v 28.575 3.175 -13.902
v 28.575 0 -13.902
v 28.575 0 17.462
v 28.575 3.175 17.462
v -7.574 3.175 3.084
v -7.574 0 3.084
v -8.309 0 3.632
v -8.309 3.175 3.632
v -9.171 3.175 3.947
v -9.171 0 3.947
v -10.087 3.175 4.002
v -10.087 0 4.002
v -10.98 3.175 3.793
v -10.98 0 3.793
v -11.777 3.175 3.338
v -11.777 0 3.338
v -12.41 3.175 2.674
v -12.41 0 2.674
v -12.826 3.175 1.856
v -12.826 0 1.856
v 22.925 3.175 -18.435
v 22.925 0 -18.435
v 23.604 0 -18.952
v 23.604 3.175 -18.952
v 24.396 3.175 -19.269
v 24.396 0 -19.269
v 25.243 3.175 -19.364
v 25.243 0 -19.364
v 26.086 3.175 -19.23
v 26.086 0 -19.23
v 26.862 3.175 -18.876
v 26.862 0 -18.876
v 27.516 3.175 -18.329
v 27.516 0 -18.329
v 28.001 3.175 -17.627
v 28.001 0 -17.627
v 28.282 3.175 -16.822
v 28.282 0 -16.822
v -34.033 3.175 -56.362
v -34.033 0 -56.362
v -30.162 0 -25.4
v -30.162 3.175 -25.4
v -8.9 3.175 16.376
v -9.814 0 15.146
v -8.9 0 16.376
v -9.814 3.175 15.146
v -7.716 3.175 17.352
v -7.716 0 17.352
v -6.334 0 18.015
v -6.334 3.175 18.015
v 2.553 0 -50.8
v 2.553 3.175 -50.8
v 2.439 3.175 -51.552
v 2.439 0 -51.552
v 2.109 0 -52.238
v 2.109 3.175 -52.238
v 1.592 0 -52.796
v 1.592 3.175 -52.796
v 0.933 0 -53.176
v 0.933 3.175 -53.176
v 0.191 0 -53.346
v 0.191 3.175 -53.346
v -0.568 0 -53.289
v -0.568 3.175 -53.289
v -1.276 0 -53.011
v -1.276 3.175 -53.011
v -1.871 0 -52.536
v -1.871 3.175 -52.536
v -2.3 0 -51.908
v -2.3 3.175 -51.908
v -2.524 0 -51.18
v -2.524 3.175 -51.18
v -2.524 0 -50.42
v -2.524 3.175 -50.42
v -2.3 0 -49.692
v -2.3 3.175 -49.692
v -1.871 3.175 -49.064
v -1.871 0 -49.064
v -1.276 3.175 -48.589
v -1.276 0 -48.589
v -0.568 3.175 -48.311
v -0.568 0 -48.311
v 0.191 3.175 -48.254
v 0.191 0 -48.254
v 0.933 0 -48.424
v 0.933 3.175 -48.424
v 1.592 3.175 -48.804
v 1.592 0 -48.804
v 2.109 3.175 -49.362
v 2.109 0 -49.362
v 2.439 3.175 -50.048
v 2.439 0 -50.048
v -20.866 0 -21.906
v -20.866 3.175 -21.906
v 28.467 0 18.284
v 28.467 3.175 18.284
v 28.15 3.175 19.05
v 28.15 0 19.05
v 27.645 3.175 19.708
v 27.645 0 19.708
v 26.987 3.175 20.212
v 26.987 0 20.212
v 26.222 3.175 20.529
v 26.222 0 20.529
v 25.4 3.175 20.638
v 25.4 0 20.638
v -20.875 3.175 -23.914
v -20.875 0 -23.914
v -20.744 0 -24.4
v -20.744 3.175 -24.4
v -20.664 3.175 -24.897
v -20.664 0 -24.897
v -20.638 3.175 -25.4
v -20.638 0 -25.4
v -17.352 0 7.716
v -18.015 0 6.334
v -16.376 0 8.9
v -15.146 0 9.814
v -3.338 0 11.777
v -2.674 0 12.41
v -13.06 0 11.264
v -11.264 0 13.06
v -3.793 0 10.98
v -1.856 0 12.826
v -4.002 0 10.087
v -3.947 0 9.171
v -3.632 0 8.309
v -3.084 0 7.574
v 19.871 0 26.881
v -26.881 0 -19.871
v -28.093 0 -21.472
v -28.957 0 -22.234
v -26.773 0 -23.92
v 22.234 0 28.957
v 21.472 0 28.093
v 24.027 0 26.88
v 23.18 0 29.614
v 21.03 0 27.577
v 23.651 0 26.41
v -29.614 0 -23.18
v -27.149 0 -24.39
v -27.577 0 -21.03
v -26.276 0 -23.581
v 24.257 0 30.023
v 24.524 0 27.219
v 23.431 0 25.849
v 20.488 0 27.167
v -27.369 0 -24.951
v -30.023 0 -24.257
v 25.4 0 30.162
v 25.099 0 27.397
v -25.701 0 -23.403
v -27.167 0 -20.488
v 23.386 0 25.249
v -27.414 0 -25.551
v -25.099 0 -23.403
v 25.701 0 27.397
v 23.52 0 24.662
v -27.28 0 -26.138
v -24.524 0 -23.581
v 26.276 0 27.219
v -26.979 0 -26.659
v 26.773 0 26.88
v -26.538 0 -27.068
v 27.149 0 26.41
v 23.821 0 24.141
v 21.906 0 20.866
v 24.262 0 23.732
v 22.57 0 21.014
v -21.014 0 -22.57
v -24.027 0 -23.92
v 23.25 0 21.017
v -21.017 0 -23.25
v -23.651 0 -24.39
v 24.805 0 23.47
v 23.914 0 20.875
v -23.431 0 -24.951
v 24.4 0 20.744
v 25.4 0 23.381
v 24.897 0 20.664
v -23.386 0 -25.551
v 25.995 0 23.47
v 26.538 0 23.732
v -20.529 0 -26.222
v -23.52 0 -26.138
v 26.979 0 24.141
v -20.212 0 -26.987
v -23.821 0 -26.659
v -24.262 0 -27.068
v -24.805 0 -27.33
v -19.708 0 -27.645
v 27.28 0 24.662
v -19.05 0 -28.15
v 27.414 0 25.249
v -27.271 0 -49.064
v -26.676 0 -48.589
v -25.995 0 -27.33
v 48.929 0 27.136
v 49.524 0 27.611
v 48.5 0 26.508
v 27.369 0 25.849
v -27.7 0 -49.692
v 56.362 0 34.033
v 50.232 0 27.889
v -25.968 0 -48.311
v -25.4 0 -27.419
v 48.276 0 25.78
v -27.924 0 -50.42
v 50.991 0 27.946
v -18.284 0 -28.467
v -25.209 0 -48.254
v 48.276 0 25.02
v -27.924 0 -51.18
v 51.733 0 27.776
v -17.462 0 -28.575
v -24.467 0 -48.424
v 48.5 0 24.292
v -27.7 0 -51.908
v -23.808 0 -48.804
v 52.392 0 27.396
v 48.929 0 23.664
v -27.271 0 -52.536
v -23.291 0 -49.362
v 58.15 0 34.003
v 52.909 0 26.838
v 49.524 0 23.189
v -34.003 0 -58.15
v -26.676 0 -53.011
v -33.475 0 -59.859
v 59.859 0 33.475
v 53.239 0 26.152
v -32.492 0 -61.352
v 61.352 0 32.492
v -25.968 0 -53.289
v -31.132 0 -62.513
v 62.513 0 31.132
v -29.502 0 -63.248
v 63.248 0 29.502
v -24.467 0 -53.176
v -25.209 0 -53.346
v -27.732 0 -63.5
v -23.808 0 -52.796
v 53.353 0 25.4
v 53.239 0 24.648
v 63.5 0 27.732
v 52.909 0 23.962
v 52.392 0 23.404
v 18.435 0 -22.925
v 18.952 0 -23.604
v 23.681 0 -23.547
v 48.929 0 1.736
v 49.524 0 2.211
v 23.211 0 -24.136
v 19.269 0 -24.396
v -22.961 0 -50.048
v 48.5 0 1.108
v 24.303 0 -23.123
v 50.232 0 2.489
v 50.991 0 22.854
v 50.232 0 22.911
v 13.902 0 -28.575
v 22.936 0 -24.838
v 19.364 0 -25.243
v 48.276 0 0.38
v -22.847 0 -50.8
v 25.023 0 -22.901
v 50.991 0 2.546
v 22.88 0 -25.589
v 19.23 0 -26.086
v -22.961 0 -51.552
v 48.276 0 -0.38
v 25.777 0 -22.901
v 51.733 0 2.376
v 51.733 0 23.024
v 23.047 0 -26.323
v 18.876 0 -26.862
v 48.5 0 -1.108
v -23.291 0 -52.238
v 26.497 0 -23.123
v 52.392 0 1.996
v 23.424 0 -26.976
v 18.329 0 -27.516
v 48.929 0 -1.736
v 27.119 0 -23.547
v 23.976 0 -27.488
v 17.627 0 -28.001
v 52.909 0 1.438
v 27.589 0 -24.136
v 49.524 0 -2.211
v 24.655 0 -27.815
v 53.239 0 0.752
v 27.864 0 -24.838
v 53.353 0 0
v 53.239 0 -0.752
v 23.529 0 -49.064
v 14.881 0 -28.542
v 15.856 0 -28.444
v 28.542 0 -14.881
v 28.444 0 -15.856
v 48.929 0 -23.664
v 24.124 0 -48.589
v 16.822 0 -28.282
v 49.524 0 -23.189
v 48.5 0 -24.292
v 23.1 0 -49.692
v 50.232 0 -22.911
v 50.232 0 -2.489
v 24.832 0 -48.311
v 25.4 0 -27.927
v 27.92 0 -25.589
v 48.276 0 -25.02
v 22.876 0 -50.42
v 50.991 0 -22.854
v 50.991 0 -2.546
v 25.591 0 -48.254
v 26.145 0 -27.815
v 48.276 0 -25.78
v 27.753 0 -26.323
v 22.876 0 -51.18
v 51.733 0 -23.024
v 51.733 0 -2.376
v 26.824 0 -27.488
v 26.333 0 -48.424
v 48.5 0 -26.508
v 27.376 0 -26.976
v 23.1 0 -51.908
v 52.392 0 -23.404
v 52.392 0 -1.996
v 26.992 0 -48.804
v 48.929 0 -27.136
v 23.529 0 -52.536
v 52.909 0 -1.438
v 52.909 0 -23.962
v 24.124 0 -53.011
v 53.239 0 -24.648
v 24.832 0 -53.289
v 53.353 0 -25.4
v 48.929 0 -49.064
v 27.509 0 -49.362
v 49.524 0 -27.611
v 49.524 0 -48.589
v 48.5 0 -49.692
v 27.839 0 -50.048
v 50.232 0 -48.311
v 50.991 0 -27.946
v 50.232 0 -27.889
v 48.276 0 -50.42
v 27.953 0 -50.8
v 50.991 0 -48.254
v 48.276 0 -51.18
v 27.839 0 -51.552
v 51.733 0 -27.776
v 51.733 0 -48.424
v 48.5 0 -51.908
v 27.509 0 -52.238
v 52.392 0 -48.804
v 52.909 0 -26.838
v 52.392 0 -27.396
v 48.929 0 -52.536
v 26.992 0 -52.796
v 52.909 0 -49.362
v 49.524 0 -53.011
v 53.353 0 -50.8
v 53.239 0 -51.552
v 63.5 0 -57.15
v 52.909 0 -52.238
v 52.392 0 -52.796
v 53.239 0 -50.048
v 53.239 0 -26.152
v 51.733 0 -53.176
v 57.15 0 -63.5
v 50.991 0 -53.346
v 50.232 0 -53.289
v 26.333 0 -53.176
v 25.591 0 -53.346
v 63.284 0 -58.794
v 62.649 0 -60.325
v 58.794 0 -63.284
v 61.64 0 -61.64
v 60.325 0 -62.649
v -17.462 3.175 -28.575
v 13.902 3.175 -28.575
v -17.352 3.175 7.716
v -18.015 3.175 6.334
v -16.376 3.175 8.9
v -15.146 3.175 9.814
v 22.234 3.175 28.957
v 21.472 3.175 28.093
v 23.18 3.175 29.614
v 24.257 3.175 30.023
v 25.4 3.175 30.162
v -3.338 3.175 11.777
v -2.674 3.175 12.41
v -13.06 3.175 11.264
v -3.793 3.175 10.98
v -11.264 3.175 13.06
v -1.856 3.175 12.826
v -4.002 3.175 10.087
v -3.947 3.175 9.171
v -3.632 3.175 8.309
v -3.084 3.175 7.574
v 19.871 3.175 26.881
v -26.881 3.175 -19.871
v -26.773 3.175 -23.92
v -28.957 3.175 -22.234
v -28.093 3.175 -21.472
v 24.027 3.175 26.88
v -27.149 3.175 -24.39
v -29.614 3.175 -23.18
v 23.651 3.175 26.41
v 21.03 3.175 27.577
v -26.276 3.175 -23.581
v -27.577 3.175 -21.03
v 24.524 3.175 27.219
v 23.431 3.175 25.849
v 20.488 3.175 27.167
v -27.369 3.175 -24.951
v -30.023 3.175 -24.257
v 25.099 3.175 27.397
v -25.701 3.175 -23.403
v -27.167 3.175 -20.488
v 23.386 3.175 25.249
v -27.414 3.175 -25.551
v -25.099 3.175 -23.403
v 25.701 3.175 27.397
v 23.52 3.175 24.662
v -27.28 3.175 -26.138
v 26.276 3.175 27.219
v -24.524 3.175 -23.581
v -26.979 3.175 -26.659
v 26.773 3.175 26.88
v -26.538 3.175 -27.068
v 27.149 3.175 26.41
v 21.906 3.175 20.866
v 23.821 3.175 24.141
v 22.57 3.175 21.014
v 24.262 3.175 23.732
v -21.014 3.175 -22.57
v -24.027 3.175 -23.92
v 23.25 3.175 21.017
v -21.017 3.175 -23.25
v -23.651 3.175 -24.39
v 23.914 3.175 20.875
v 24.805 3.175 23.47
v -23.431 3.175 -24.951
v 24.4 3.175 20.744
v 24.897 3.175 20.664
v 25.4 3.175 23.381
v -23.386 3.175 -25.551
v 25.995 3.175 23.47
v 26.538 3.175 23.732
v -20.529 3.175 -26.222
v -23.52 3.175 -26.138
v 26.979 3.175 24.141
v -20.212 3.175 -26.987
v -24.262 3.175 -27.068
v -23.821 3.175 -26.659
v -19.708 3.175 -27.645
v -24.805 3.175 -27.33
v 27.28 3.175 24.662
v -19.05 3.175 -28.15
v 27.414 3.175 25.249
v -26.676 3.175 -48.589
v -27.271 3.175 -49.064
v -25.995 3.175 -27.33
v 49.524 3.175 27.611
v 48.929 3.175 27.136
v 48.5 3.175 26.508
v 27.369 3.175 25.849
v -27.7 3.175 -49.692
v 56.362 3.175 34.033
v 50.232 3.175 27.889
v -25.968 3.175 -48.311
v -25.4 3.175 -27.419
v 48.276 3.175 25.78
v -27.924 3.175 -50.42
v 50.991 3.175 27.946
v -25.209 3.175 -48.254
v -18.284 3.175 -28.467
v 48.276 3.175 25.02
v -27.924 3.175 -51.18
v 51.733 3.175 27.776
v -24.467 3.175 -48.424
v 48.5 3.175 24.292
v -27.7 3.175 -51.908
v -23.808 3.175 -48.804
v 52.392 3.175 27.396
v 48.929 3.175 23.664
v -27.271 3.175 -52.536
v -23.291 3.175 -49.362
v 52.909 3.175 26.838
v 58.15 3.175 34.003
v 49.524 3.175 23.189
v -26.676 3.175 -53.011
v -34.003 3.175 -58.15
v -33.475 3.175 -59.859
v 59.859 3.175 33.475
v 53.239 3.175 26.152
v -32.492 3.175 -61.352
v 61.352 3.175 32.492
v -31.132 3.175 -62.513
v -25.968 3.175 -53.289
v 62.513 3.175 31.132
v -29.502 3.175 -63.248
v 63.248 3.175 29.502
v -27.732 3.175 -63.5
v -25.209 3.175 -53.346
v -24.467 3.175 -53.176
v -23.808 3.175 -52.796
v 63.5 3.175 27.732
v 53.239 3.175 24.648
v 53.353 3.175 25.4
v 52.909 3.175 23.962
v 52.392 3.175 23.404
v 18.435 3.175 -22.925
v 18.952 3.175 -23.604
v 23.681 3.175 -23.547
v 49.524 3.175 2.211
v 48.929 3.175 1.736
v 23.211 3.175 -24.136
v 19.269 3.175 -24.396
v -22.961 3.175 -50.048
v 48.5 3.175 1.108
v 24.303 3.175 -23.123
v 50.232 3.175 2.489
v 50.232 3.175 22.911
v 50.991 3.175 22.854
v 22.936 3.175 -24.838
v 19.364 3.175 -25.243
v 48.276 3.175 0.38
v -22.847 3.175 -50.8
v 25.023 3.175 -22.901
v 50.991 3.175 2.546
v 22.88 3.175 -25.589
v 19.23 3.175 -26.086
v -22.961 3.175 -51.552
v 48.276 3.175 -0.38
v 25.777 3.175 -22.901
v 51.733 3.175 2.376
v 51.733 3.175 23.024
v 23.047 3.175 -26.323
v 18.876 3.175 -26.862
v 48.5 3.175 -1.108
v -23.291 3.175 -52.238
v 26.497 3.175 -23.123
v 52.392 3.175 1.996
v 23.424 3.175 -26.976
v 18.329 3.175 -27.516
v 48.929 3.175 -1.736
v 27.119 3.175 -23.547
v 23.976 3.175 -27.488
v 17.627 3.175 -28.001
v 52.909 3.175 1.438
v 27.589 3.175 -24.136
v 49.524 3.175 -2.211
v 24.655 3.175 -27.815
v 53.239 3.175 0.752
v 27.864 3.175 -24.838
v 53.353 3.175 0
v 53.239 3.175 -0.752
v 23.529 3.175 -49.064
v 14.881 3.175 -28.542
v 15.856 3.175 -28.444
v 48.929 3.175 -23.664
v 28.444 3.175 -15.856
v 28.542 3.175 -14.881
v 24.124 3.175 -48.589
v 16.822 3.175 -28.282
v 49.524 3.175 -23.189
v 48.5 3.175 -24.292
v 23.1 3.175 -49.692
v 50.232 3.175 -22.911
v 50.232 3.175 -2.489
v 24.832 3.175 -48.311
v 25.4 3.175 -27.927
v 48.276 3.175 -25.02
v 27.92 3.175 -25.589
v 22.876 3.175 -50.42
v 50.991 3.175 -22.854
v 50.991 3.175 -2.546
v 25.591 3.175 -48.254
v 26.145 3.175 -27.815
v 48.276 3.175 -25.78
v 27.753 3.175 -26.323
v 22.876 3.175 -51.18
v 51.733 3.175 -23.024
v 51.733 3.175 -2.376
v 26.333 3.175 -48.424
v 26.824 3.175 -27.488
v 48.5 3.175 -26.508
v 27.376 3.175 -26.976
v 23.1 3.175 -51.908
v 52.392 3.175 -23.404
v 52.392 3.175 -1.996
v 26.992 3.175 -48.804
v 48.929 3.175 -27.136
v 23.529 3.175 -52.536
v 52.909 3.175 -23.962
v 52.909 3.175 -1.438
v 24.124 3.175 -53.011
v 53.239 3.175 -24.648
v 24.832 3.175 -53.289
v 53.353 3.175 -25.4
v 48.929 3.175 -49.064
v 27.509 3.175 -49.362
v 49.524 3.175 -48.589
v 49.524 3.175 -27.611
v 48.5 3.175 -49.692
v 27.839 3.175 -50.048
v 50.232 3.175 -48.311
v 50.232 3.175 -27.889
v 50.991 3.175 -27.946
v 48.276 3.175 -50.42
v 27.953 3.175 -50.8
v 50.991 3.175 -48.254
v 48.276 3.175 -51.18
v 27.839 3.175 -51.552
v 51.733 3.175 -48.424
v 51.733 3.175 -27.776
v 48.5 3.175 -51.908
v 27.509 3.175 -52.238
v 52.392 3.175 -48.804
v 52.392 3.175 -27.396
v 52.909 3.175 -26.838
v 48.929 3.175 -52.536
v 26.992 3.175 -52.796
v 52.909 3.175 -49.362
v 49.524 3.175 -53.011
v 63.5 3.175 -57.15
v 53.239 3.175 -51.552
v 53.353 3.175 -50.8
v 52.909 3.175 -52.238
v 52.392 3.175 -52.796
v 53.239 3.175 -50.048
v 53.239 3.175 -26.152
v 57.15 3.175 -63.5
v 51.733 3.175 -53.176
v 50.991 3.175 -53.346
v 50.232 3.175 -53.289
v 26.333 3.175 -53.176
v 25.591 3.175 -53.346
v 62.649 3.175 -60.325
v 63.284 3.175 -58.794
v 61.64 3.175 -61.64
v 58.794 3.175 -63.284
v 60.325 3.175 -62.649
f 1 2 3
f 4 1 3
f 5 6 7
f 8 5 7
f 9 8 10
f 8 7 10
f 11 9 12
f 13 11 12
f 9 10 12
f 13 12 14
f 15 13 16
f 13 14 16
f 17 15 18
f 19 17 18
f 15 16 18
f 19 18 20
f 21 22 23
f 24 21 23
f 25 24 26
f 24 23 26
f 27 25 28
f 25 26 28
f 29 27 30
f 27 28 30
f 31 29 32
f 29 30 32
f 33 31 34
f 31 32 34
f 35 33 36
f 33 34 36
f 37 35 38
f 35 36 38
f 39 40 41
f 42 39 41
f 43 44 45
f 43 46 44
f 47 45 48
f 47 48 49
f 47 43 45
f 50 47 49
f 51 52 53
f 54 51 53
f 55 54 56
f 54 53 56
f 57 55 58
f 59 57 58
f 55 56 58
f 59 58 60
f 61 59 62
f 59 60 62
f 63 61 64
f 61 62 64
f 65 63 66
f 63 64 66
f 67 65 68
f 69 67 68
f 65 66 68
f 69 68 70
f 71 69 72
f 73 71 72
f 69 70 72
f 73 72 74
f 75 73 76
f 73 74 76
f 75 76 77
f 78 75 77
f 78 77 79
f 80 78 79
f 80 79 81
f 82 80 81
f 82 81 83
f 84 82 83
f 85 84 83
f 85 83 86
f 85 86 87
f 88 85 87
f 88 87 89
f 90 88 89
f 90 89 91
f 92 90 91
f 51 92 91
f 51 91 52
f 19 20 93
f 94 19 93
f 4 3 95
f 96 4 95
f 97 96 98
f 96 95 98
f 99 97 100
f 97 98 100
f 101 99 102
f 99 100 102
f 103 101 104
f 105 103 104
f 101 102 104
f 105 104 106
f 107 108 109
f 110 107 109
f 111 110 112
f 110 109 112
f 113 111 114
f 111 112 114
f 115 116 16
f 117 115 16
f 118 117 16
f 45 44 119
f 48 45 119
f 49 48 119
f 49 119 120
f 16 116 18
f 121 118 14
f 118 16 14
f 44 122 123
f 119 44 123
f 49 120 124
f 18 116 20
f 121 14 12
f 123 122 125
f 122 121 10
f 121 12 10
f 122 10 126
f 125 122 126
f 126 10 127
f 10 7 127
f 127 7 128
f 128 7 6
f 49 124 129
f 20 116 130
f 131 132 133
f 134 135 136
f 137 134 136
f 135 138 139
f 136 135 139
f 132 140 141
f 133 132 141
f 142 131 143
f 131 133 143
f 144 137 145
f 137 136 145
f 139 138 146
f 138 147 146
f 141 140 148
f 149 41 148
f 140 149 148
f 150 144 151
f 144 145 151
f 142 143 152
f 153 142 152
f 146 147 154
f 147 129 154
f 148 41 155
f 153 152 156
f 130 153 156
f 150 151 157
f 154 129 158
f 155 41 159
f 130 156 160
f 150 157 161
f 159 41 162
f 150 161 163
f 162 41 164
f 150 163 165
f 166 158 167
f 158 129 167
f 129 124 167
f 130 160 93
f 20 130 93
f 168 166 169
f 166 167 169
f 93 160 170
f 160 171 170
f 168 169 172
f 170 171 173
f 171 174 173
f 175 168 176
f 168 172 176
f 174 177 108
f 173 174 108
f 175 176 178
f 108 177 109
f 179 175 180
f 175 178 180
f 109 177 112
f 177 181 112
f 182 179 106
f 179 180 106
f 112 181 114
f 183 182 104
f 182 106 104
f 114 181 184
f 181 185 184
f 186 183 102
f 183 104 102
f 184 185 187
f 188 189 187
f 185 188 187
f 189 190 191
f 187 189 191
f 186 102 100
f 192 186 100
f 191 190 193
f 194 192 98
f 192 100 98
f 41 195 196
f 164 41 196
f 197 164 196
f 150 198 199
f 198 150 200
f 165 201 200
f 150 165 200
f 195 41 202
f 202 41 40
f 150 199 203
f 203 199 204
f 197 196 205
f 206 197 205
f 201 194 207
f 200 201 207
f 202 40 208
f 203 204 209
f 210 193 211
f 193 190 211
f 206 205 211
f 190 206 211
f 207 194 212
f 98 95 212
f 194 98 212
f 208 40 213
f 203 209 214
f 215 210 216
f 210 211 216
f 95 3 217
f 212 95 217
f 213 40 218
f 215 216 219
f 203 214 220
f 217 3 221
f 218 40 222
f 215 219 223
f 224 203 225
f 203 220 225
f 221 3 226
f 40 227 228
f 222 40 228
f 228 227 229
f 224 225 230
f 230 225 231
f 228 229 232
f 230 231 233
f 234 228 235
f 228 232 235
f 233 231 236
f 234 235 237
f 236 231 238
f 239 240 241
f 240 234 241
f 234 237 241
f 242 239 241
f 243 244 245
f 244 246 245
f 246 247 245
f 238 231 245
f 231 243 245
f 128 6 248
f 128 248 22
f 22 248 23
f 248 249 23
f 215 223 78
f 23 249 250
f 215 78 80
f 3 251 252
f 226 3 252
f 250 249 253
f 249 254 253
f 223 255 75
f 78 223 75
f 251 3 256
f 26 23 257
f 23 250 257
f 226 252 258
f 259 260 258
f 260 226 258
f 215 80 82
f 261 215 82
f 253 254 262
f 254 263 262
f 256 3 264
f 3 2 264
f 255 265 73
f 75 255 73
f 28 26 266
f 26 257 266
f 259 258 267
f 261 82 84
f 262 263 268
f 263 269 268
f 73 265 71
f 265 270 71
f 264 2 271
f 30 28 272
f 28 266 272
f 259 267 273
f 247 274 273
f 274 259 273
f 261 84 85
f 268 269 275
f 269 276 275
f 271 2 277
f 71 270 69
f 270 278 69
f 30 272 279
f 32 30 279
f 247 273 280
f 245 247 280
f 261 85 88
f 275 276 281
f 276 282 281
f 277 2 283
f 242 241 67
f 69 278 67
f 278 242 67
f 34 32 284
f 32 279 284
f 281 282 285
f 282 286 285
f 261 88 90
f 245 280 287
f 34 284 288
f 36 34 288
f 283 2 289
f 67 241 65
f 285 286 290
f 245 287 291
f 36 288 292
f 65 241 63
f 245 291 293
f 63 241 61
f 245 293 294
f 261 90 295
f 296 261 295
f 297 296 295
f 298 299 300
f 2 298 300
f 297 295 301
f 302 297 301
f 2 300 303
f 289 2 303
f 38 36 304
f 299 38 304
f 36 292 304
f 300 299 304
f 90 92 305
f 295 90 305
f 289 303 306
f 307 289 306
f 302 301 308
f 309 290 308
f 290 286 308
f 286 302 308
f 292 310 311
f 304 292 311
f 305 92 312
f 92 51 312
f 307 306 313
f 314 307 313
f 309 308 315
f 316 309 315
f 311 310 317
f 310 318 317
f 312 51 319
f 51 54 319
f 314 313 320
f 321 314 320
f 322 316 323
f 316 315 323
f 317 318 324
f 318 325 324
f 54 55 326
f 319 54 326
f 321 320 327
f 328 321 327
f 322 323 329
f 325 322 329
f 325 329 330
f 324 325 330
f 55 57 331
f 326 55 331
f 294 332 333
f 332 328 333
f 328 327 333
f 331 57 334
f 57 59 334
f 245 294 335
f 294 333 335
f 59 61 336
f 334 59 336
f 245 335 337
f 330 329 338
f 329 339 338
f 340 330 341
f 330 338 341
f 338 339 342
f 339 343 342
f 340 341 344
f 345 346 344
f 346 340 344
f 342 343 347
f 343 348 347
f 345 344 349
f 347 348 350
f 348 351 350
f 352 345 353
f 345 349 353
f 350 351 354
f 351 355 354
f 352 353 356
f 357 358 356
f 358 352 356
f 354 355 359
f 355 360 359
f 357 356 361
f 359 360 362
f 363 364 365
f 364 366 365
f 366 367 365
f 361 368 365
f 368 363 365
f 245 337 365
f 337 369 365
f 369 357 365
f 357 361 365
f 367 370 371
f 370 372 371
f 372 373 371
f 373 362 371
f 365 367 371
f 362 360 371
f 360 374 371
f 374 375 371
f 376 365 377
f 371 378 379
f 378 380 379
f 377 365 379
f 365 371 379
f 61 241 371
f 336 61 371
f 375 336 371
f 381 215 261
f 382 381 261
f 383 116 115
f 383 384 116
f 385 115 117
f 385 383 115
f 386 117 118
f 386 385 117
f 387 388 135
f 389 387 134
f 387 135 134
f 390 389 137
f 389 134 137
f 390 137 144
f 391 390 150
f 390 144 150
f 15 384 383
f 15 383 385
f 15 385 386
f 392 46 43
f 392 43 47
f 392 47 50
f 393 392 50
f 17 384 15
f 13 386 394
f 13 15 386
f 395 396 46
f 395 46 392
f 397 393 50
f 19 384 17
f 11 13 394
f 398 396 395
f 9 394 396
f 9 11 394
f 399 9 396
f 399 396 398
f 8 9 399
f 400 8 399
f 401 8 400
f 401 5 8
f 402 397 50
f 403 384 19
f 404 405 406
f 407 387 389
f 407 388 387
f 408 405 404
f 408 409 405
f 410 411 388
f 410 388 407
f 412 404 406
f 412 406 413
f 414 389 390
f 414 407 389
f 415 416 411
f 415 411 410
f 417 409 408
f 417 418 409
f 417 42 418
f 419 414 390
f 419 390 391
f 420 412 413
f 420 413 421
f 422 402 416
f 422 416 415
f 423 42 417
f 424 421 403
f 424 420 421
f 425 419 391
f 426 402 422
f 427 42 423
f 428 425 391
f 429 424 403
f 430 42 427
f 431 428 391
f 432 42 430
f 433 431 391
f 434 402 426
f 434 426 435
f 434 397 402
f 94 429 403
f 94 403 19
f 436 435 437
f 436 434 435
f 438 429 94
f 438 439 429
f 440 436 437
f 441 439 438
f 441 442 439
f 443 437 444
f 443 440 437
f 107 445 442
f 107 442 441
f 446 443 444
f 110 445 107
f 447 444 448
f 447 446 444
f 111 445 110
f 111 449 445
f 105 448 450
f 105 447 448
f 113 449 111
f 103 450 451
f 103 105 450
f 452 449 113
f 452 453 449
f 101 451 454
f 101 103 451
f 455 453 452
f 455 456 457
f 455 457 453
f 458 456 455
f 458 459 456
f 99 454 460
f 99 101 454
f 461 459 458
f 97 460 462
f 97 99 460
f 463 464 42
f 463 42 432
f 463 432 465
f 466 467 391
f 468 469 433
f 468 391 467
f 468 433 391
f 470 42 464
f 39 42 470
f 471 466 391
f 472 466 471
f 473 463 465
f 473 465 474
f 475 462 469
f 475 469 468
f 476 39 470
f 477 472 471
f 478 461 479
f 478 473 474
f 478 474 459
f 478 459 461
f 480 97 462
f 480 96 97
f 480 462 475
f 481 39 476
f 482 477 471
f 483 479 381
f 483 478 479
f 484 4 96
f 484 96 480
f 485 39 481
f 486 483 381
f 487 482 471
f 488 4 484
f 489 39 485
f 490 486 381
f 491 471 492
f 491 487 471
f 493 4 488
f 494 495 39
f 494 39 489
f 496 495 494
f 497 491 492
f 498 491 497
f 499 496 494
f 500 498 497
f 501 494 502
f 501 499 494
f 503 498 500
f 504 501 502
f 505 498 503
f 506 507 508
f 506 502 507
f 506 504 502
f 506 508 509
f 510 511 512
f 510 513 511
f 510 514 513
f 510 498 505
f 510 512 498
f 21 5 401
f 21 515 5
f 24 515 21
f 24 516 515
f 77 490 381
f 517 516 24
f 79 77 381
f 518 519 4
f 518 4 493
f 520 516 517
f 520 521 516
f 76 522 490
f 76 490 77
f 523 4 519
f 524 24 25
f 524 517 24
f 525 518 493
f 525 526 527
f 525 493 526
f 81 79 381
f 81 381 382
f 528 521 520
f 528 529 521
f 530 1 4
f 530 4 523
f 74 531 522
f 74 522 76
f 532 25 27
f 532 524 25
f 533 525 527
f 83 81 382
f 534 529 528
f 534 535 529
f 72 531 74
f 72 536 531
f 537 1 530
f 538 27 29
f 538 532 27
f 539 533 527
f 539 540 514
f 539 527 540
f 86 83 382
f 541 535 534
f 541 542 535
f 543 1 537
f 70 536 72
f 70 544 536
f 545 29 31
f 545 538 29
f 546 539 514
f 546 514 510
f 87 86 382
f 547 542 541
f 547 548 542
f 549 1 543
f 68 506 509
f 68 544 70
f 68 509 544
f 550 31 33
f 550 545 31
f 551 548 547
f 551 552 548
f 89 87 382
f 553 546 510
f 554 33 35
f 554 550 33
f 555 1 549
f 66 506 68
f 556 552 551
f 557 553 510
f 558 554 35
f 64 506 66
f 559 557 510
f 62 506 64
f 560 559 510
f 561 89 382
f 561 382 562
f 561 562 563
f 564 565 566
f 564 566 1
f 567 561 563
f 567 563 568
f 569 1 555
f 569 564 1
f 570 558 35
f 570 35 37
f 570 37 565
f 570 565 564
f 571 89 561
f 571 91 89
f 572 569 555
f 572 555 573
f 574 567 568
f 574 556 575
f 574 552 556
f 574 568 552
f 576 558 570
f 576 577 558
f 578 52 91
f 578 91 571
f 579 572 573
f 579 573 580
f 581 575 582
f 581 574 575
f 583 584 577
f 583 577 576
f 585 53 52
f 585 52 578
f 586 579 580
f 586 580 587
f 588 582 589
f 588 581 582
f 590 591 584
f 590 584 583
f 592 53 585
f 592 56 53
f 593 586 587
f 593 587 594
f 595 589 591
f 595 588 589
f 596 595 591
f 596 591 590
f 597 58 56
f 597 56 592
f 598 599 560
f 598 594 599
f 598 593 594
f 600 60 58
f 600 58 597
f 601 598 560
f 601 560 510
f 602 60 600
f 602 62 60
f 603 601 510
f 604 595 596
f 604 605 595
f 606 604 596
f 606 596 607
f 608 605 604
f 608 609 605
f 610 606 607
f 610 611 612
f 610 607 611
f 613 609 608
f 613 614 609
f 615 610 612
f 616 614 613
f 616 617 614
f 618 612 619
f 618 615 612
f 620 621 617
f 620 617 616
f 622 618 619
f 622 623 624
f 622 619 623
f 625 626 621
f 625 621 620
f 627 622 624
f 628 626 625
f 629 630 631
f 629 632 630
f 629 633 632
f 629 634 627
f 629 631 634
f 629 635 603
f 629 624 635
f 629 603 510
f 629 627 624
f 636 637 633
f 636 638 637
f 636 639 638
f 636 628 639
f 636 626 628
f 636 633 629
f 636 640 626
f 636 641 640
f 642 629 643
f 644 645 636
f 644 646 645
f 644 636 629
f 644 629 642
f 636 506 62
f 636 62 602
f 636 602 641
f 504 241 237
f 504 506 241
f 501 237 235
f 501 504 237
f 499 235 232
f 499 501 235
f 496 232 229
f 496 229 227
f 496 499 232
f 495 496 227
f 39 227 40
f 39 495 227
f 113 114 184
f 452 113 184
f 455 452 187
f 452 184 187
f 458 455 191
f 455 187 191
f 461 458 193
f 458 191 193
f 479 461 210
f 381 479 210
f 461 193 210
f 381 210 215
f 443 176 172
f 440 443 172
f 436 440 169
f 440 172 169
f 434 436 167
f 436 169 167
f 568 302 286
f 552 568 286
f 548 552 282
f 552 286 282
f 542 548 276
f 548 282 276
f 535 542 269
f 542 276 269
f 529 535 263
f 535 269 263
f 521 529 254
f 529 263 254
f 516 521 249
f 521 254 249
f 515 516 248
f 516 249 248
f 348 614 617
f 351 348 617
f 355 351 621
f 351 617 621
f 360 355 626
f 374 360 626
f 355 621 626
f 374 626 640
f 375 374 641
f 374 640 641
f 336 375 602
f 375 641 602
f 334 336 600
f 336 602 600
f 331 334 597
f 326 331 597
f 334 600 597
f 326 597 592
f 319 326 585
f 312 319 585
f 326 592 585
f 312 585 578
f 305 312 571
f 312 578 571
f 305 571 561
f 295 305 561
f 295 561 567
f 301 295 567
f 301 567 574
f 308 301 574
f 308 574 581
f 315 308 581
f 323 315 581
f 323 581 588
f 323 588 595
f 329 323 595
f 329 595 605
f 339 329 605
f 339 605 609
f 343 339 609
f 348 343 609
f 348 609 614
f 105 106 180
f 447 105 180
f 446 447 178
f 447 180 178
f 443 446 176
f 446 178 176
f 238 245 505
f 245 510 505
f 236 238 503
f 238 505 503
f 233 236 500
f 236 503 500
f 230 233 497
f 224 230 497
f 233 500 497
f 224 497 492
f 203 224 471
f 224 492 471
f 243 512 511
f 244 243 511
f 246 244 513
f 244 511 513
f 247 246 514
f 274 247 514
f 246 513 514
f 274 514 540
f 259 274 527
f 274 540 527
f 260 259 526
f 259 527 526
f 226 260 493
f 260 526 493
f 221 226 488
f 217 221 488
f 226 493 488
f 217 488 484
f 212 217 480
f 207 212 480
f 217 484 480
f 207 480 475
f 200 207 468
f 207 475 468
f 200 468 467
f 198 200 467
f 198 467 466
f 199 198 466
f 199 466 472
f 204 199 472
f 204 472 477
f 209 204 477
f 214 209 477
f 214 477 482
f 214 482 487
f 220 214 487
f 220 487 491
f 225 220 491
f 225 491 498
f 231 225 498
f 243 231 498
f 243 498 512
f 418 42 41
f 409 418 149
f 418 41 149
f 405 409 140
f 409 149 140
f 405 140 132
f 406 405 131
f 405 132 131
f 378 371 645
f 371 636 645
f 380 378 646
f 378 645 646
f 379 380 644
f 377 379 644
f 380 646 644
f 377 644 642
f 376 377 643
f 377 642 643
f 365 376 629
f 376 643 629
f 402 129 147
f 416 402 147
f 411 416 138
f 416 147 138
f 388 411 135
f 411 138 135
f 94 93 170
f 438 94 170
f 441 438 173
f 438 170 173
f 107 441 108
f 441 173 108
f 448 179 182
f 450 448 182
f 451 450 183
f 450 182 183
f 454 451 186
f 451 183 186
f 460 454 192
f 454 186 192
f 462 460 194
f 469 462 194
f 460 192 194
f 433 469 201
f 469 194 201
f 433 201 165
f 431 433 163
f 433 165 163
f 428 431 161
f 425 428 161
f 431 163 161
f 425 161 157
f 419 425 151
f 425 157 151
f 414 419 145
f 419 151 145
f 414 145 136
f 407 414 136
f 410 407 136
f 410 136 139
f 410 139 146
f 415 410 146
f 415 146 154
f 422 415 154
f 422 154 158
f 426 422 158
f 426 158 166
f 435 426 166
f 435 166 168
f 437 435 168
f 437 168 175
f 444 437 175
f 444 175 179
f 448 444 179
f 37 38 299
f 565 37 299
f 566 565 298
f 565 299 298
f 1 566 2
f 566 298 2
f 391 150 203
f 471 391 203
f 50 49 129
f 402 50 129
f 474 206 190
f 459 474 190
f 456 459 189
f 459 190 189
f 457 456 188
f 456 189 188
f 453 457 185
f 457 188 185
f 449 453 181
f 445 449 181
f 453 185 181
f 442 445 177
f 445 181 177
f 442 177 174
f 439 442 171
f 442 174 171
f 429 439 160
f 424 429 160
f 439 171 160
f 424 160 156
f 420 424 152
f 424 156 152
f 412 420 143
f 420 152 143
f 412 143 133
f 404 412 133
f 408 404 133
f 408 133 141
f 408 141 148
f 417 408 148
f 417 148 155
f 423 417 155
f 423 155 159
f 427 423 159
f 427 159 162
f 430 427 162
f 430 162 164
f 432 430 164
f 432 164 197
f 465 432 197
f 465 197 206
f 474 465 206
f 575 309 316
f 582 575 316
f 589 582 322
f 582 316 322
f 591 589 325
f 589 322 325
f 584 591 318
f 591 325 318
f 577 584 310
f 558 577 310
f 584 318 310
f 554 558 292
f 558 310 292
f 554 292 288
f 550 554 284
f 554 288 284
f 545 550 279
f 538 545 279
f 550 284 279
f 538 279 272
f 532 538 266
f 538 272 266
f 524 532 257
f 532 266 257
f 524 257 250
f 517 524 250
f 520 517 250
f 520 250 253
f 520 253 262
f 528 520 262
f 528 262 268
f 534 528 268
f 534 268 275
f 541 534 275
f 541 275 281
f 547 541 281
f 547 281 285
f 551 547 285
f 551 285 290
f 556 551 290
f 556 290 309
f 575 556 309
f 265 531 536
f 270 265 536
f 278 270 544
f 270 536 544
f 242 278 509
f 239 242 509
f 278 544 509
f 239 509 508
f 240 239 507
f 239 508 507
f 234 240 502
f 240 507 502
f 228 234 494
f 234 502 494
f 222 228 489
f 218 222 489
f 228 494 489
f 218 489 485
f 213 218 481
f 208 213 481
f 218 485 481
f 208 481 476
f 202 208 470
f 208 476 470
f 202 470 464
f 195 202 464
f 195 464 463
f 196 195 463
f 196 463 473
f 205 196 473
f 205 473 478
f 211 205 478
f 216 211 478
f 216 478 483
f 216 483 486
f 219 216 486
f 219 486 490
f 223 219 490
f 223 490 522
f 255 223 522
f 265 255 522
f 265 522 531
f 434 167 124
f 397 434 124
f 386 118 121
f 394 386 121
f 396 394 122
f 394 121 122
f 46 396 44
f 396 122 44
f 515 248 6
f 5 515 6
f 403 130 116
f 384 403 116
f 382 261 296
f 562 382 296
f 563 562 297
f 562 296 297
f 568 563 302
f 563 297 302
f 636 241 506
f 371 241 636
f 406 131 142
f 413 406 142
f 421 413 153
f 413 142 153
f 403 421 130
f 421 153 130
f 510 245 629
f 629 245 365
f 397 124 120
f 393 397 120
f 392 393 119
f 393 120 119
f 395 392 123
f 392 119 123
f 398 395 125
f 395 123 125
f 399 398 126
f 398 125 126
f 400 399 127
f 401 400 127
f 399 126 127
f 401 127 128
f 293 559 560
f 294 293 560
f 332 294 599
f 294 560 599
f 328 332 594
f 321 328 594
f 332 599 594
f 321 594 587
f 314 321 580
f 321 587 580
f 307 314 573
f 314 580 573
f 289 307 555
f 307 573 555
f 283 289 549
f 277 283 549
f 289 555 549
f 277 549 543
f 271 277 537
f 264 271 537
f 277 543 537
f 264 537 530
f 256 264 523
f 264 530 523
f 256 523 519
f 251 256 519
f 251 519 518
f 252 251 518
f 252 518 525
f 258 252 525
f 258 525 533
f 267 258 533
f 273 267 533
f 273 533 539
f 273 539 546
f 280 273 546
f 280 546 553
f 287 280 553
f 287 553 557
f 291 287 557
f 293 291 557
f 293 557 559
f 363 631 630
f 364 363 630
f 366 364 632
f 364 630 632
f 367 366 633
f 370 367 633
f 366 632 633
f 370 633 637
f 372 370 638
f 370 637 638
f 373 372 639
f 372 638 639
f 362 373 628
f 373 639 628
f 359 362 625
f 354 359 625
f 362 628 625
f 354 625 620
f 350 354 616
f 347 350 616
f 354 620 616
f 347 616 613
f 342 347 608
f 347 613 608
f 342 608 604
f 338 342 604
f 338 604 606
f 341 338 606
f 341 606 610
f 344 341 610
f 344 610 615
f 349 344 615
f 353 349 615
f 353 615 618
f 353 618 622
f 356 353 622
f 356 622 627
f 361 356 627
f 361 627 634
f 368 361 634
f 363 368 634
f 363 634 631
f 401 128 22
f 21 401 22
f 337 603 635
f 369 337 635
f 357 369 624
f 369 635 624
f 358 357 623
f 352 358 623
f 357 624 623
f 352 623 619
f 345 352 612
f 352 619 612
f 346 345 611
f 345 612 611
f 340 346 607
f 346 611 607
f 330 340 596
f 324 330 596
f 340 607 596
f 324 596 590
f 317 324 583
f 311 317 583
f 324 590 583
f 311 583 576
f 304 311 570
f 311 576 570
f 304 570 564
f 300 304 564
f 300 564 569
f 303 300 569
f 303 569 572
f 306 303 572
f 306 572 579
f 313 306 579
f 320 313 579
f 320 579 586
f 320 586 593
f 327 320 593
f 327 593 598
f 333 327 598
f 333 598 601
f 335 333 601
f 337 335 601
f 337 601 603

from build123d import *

# Parameters (mm, degrees)
SKETCH1_W                  = 127
SKETCH1_H                  = 127
BOSS_EXTRUDE_1_DEPTH       = 3.175
SKETCH5_R                  = 2.5273
SKETCH5_R_2                = 2.0193
CUT_EXTRUDE1_DEPTH         = 90.858670283
FILLET1_R                  = 6.35
FILLET2_R                  = 6.35
FILLET3_R                  = 6.35
F_10_CLEARANCE_HOLE1_D     = 5.1054
F_10_CLEARANCE_HOLE1_DEPTH = 9.906
F_10_CLEARANCE_HOLE1_TIP   = 1.533816902


with BuildPart() as part:
    # Sketch1 → Boss-Extrude 1 (new body)
    with BuildSketch(Plane(origin=(0, 0, 0), x_dir=(1, 0, 0), z_dir=(0, 1, 0))):
        Rectangle(SKETCH1_W, SKETCH1_H)
    extrude(amount=BOSS_EXTRUDE_1_DEPTH)

    # Sketch5 → Cut-Extrude1 (cut, through all)
    with BuildSketch(Plane.XZ):
        with BuildLine():
            ThreePointArc((-30.1625, -25.4), (-29.613538389, -23.180202601), (-28.093208455, -21.472146328))
            ThreePointArc((-28.093208455, -21.472146328), (-27.35728191, -20.769991802), (-26.881161446, -19.871149123))
            Line((-26.881161446, -19.871149123), (-17.158114653, 8.86613294))
            ThreePointArc((-17.158114653, 8.86613294), (-12.122211864, 12.122211864), (-8.86613294, 17.158114653))
            Line((-8.86613294, 17.158114653), (19.871149123, 26.881161446))
            ThreePointArc((19.871149123, 26.881161446), (20.769991802, 27.35728191), (21.472146328, 28.093208455))
            ThreePointArc((21.472146328, 28.093208455), (23.180202601, 29.613538389), (25.4, 30.1625))
            Line((25.4, 30.1625), (63.5, 34.925))
            Line((63.5, 34.925), (63.5, 63.5))
            Line((63.5, 63.5), (-63.5, 63.5))
            Line((-63.5, 63.5), (-63.5, -63.5))
            Line((-63.5, -63.5), (-34.925, -63.5))
            Line((-34.925, -63.5), (-30.1625, -25.4))
        make_face()
        with BuildLine():
            ThreePointArc((16.821574871, -28.281660245), (19.229977614, -26.085792739), (18.434943467, -22.925071528))
            Line((18.434943467, -22.925071528), (-7.573712289, 3.083584229))
            ThreePointArc((-7.573712289, 3.083584229), (-10.541284963, 3.930219773), (-12.826295631, 1.856092108))
            Line((-12.826295631, 1.856092108), (-20.866122824, -21.906292943))
            ThreePointArc((-20.866122824, -21.906292943), (-21.033571343, -22.90957249), (-20.875162107, -23.914318912))
            ThreePointArc((-20.875162107, -23.914318912), (-20.697290849, -24.647714886), (-20.6375, -25.4))
            ThreePointArc((-20.6375, -25.4), (-19.70756403, -27.64506403), (-17.4625, -28.575))
            Line((-17.4625, -28.575), (13.902307909, -28.575))
            ThreePointArc((13.902307909, -28.575), (15.369291874, -28.501480873), (16.821574871, -28.281660245))
        make_face()
        with BuildLine():
            ThreePointArc((28.281660245, -16.821574871), (28.501480873, -15.369291874), (28.575, -13.902307909))
            Line((28.575, -13.902307909), (28.575, 17.4625))
            ThreePointArc((28.575, 17.4625), (27.64506403, 19.70756403), (25.4, 20.6375))
            ThreePointArc((25.4, 20.6375), (24.647714886, 20.697290849), (23.914318912, 20.875162107))
            ThreePointArc((23.914318912, 20.875162107), (22.90957249, 21.033571343), (21.906292943, 20.866122824))
            Line((21.906292943, 20.866122824), (-1.856092108, 12.826295631))
            ThreePointArc((-1.856092108, 12.826295631), (-3.930219773, 10.541284963), (-3.083584229, 7.573712289))
            Line((-3.083584229, 7.573712289), (22.925071528, -18.434943467))
            ThreePointArc((22.925071528, -18.434943467), (26.085792739, -19.229977614), (28.281660245, -16.821574871))
        make_face()
        with Locations(Location((25.4, -25.4, 0), (0, 0, 270))):
            Circle(SKETCH5_R)
        with Locations(Location((-25.4, -25.4, 0), (0, 0, 270))):
            Circle(SKETCH5_R_2)
        with Locations(Location((25.4, 25.4, 0), (0, 0, 270))):
            Circle(SKETCH5_R_2)
    extrude(amount=-CUT_EXTRUDE1_DEPTH, mode=Mode.SUBTRACT)

    # Fillet1
    fillet1_edges = [part.edges().sort_by_distance(p)[0] for p in [
        (63.5, 1.5875, -63.5),
    ]]
    fillet(fillet1_edges, radius=FILLET1_R)

    # Fillet2
    fillet2_edges = [part.edges().sort_by_distance(p)[0] for p in [
        (-34.925, 1.5875, -63.5),
        (63.5, 1.5875, 34.925),
    ]]
    fillet(fillet2_edges, radius=FILLET2_R)

    # Fillet3
    fillet3_edges = [part.edges().sort_by_distance(p)[0] for p in [
        (-8.86613294, 1.5875, 17.158114653),
        (-17.158114653, 1.5875, 8.86613294),
    ]]
    fillet(fillet3_edges, radius=FILLET3_R)

    # #10 Clearance Hole1
    with Locations(Plane(origin=(0, 0, 0), x_dir=(-1, 0, 0), z_dir=(0, -1, 0))):
        with Locations((-50.8, 50.8), (-25.4, 50.8), (38.1, 50.8), (50.8, 50.8), (0, 50.8), (76.2, 50.8), (25.4, 50.8), (-50.8, 25.4), (-50.8, 0), (-50.8, -25.4), (-50.8, -50.8), (-50.8, -76.2)):
            Hole(F_10_CLEARANCE_HOLE1_D / 2, depth=F_10_CLEARANCE_HOLE1_DEPTH)
            with Locations((0, 0, -(F_10_CLEARANCE_HOLE1_DEPTH + F_10_CLEARANCE_HOLE1_TIP / 2))):  # 118° drill point
                Cone(0, F_10_CLEARANCE_HOLE1_D / 2, F_10_CLEARANCE_HOLE1_TIP, mode=Mode.SUBTRACT)


solid = part.part
